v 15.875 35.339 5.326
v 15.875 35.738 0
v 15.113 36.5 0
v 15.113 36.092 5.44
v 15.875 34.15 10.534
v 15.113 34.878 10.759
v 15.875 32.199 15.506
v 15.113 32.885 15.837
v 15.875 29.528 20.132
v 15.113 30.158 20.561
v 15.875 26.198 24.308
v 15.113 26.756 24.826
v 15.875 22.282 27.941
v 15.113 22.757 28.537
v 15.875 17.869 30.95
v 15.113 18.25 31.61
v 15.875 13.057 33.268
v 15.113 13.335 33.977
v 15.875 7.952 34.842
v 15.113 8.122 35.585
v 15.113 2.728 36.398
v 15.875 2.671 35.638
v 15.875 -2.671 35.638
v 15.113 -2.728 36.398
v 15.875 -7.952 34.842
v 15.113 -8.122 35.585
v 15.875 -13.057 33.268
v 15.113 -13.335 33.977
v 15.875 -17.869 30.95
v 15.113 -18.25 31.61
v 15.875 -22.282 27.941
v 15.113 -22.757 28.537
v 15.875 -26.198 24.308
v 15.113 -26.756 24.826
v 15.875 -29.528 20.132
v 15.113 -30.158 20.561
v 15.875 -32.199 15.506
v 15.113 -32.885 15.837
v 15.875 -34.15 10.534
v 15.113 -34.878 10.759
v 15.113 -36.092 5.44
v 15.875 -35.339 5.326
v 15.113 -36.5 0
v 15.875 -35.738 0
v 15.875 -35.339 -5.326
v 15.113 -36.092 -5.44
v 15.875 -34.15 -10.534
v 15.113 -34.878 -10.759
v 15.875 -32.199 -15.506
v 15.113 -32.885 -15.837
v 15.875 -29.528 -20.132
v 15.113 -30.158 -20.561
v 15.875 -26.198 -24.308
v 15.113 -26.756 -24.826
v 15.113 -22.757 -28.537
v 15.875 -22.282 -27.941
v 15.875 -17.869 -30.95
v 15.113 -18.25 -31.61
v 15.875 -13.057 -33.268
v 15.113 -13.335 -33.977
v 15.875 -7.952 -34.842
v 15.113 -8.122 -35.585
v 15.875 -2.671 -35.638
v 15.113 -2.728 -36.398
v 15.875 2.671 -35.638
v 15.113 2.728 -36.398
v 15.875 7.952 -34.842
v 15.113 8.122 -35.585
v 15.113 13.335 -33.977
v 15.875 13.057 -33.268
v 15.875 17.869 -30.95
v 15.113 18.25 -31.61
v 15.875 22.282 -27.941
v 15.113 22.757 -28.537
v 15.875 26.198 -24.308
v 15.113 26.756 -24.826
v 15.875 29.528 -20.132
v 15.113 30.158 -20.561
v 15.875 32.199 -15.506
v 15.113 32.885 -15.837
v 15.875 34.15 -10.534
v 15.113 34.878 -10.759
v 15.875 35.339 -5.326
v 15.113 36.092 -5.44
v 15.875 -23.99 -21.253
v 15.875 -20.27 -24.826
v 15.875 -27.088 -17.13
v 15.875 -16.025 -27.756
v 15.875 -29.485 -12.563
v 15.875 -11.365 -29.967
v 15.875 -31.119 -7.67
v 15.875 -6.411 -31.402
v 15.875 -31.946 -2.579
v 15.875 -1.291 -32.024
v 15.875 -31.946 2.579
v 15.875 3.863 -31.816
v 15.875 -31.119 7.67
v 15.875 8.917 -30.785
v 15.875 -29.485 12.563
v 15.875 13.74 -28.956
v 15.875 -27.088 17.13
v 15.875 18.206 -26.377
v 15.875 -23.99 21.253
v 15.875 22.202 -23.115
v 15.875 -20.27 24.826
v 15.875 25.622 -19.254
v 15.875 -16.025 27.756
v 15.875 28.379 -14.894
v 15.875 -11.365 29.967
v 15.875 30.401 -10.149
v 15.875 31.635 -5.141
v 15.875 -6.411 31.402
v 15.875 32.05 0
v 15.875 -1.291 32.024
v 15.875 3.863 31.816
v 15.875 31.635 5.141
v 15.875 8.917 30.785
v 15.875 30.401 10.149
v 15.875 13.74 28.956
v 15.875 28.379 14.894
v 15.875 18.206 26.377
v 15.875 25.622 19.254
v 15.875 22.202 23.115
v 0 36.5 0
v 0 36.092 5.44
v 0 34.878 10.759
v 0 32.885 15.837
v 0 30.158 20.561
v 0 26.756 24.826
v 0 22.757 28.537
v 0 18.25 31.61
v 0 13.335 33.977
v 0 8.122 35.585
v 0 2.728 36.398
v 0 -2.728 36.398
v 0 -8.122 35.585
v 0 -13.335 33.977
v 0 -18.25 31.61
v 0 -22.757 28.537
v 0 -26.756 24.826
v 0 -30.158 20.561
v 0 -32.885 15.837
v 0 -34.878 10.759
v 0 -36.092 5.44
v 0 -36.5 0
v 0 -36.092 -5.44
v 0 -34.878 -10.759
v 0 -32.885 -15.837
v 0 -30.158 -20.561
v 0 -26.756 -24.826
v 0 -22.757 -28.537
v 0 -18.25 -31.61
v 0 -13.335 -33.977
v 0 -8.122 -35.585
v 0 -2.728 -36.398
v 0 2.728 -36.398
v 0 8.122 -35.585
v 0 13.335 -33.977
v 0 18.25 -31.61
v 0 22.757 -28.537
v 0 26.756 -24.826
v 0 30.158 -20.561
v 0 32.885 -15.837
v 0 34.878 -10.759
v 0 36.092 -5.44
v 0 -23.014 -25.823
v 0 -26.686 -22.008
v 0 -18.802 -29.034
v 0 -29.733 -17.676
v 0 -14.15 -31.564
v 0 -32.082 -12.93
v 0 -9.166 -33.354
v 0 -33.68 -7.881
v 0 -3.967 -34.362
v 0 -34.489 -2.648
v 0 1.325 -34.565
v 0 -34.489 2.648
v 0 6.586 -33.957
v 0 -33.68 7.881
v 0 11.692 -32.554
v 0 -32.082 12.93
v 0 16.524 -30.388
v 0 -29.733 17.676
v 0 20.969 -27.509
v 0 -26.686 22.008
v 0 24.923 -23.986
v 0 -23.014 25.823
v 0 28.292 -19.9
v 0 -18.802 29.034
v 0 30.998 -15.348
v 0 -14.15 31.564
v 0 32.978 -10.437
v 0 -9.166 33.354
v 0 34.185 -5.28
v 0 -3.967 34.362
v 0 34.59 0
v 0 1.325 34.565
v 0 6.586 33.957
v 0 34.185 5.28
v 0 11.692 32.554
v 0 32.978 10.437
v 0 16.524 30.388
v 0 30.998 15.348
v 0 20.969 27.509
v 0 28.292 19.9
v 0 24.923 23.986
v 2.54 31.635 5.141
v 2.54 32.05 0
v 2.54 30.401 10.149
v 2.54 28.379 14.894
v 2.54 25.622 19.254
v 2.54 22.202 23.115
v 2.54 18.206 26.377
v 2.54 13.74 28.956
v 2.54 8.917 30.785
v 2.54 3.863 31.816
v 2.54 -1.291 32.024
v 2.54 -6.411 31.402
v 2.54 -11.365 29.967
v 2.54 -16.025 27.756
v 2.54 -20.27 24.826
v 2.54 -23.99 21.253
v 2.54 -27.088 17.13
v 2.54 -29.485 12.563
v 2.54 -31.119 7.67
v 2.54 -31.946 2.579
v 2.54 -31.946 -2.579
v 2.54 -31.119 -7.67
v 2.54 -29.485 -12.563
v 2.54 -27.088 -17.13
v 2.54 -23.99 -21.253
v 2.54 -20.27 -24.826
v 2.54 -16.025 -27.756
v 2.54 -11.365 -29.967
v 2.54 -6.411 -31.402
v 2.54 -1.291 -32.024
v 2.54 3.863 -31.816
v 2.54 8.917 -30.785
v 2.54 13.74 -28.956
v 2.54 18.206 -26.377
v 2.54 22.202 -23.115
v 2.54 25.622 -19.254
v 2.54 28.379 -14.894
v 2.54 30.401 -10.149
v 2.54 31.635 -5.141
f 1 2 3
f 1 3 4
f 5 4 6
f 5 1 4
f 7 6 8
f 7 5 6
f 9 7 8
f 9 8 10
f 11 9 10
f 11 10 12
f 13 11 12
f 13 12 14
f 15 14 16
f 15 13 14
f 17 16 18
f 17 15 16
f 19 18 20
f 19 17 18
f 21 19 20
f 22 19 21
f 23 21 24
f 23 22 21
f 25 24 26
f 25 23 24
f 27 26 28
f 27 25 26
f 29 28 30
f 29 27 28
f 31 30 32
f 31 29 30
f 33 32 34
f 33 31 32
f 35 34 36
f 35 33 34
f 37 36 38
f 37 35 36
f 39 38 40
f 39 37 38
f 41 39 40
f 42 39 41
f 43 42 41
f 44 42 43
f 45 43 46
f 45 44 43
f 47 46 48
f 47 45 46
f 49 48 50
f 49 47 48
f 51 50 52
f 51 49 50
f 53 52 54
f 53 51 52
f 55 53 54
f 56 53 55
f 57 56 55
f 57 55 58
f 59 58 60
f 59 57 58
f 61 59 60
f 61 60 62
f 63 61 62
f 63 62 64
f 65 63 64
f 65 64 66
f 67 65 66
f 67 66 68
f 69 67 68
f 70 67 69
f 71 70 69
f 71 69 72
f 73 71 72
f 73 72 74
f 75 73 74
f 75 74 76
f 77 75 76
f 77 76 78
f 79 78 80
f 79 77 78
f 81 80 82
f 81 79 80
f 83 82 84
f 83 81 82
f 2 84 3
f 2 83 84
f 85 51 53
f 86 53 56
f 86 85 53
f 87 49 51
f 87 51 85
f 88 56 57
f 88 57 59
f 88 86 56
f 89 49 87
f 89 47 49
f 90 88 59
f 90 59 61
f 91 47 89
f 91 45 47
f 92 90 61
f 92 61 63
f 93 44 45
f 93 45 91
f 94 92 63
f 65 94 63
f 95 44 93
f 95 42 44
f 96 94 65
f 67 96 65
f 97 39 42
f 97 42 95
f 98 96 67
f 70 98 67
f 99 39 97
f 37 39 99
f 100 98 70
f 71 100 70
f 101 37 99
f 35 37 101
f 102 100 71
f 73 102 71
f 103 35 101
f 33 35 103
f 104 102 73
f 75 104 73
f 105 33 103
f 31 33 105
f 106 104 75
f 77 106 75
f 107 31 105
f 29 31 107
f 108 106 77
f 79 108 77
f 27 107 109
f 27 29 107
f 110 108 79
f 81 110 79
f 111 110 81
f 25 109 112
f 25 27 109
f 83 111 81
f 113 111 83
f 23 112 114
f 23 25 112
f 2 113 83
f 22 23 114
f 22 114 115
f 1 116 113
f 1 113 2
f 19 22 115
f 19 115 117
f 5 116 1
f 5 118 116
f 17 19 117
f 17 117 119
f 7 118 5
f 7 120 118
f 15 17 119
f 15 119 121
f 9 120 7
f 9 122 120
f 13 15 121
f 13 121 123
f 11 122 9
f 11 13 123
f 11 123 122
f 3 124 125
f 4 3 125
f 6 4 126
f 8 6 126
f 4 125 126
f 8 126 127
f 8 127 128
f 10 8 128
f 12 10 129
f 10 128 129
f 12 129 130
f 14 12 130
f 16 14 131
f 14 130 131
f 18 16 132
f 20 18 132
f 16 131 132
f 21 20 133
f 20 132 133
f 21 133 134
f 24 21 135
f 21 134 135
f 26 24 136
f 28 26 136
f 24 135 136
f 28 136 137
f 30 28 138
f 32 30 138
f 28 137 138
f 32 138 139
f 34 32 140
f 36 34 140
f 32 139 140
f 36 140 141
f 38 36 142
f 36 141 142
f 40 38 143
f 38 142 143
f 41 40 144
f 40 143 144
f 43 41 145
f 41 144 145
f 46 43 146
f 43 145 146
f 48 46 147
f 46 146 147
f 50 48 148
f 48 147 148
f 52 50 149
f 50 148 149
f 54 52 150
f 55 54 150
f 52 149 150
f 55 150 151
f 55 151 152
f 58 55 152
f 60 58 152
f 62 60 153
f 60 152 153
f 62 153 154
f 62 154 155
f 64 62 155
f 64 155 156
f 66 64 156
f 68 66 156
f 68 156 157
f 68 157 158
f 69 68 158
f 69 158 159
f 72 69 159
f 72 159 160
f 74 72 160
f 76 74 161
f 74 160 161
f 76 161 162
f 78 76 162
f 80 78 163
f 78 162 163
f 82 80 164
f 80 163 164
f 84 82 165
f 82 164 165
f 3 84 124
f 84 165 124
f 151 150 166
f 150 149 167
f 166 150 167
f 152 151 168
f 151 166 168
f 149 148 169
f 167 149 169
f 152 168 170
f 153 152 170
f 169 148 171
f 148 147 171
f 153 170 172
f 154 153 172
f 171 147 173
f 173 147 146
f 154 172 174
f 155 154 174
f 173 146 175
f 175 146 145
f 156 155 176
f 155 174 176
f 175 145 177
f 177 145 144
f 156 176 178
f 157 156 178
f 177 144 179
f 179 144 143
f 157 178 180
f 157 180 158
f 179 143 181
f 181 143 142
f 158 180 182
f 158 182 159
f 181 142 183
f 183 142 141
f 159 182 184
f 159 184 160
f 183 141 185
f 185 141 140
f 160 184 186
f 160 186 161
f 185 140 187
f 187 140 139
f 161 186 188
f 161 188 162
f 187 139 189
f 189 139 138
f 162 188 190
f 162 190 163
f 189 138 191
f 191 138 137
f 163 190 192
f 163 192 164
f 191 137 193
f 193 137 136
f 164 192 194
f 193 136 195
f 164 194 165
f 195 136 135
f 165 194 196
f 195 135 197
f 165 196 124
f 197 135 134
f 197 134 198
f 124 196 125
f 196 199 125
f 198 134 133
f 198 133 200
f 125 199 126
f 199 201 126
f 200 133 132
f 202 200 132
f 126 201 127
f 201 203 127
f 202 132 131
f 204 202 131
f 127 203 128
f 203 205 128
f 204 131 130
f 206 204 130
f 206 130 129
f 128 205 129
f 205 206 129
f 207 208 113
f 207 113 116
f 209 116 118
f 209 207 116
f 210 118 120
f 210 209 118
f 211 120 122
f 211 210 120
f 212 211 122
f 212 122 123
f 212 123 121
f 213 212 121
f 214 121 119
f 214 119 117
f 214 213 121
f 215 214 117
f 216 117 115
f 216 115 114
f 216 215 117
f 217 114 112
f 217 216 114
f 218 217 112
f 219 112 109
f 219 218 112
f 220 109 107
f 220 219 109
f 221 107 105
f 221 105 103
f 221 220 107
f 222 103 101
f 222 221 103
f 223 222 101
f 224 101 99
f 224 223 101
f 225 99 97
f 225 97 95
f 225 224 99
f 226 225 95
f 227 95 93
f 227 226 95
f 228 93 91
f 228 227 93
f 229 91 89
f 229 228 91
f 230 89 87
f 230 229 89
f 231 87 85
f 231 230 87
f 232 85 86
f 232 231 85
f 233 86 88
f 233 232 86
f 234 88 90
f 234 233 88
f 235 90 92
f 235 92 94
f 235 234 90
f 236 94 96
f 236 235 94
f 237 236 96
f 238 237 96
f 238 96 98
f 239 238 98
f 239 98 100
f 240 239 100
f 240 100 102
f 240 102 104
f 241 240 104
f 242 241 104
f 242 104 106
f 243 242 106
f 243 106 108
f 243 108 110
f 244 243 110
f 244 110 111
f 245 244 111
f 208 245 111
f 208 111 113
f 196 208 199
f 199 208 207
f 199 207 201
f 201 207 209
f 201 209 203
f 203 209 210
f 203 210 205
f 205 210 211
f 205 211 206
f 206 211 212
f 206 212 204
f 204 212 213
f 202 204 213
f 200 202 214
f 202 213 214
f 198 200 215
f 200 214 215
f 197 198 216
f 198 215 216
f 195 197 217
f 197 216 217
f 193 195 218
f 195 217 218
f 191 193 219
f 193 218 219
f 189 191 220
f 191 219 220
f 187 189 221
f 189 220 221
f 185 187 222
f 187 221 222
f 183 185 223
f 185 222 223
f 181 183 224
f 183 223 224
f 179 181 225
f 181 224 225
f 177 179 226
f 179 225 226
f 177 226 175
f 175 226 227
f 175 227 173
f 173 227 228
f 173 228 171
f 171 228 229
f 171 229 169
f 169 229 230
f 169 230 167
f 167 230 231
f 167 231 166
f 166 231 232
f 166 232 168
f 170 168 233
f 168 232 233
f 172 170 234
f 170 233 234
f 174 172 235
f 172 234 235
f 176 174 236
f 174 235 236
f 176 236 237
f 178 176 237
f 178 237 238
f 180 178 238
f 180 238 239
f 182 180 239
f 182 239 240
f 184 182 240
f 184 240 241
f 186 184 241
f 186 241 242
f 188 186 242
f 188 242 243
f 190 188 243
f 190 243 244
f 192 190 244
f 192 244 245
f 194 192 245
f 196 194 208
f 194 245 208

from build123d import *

# Parameters (mm, degrees)
F0_R     = 36.5
F0_R_2   = 32.05
F1_DEPTH = 15.875
F2_SIZE  = 0.762
F3_SIZE  = 2.54


with BuildPart() as f1:
    # F0 (on Right) → F1 (new body)
    with BuildSketch(Plane.YZ):
        Circle(F0_R)
        Circle(F0_R_2, mode=Mode.SUBTRACT)
    extrude(amount=F1_DEPTH)

    # F2
    f2_edges = [f1.edges().sort_by_distance(p)[0] for p in [
        (15.875, -36.5, 0),
    ]]
    chamfer(f2_edges, length=F2_SIZE)

    # F3
    f3_edges = [f1.edges().sort_by_distance(p)[0] for p in [
        (0, -32.05, 0),
    ]]
    chamfer(f3_edges, length=F3_SIZE)


solid = f1.part
